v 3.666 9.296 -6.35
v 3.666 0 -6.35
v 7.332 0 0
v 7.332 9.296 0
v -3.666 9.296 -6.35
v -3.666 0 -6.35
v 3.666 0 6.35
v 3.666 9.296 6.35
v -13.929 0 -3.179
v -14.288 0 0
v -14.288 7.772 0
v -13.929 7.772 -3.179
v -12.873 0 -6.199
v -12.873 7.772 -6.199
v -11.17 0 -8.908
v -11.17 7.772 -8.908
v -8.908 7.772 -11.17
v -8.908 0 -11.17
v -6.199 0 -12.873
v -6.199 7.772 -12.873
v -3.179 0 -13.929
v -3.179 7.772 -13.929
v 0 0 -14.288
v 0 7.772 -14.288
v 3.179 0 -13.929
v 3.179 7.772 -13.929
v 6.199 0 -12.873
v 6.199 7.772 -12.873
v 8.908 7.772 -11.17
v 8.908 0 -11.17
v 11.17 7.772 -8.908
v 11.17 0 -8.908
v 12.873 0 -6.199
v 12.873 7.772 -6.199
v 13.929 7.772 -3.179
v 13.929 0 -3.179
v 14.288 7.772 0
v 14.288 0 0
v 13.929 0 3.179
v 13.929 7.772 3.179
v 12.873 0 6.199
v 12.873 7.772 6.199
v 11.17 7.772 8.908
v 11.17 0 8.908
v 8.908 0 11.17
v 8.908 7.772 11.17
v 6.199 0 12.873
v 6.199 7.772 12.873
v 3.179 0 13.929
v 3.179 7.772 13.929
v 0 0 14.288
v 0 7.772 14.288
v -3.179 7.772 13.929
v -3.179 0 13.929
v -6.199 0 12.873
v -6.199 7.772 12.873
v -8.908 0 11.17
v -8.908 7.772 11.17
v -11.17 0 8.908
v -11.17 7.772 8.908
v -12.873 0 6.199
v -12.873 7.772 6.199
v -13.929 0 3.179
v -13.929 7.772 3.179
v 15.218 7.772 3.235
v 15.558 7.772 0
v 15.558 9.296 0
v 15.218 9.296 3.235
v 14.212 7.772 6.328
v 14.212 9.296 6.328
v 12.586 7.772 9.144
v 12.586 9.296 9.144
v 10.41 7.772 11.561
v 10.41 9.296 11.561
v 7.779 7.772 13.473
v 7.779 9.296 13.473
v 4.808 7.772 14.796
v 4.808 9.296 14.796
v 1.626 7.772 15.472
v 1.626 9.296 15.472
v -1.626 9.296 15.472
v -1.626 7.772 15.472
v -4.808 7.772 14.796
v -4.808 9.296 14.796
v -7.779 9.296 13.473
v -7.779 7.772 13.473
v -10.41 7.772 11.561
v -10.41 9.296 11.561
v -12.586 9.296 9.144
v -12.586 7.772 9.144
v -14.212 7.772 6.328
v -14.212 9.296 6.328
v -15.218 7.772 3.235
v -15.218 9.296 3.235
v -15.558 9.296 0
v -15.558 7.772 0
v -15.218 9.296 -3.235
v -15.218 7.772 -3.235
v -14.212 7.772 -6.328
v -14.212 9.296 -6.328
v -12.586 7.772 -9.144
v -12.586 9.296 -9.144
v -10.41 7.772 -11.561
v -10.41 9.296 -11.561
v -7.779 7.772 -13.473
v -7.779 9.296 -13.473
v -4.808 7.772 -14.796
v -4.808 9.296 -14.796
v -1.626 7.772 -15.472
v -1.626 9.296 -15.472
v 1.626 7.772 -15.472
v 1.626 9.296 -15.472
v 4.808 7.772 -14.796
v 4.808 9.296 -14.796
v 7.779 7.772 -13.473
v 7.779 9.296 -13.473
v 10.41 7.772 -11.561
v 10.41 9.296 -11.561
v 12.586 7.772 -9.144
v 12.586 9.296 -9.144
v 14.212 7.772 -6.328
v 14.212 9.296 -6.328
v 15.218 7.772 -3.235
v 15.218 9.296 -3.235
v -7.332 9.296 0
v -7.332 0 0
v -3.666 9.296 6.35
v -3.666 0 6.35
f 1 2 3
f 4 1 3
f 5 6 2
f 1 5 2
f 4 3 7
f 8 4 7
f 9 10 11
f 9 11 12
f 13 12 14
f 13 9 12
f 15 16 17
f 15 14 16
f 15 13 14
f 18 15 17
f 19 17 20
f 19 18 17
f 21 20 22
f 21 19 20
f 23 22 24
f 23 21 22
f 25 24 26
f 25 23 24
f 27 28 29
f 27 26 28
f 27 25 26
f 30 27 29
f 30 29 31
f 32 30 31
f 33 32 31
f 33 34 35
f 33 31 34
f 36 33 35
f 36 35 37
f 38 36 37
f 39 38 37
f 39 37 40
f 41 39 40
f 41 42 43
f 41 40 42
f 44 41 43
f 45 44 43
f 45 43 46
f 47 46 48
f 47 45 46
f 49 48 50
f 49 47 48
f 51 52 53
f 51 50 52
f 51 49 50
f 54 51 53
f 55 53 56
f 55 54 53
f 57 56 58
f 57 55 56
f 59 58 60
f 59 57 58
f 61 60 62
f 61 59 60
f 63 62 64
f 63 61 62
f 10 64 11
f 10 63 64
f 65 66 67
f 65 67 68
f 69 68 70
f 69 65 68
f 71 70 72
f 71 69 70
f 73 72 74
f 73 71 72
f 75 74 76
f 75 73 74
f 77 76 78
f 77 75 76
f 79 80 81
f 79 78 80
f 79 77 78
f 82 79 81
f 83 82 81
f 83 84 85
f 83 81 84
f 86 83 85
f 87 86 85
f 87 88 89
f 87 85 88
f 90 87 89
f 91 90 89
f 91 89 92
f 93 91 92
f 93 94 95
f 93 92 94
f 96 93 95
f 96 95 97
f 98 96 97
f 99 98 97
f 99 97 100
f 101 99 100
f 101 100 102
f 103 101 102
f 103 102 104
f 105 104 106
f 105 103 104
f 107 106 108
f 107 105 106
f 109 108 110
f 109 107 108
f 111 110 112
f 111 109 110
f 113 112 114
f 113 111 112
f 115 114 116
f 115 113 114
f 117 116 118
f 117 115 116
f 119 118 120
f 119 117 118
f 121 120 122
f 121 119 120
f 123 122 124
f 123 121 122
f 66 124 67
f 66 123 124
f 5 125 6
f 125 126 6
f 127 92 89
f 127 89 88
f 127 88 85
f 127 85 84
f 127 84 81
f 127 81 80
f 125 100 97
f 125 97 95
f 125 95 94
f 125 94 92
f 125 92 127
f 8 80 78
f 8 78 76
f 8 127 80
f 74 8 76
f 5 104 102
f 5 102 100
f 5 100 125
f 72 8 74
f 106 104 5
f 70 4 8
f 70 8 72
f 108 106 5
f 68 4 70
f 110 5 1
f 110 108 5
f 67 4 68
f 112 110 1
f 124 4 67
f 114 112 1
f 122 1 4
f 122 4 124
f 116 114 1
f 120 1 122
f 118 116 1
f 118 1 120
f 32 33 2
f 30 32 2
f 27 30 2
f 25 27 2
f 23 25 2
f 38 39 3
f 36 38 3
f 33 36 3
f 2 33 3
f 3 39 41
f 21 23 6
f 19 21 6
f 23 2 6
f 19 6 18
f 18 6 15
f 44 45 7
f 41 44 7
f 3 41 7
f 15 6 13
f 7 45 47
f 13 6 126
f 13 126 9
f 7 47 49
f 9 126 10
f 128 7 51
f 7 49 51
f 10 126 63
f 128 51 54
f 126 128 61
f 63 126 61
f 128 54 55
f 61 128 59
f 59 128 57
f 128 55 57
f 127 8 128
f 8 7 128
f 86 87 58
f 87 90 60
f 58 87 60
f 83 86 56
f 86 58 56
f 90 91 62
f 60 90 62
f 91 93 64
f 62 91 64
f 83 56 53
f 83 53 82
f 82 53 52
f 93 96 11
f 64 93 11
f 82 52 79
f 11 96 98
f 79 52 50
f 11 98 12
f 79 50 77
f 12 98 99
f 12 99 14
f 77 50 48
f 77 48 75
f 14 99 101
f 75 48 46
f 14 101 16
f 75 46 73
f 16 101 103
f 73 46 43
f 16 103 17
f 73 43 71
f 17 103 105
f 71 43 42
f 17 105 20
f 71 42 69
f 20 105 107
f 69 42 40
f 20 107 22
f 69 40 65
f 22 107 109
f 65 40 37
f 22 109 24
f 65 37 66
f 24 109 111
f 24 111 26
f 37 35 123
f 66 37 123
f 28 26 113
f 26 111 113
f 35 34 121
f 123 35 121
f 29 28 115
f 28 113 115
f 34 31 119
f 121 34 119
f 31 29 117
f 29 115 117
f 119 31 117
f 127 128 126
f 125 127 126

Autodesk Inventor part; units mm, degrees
ref_plane "YZ Plane" through (0, 0, 0) normal (1, 0, 0) x (0, 1, 0)
ref_plane "XZ Plane" through (0, 0, 0) normal (0, 1, 0) x (-1, 0, 0)
ref_plane "XY Plane" through (0, 0, 0) normal (0, 0, 1) x (1, 0, 0)
sketch "Sketch1" plane through (0, 0, 0) normal (0, 1, 0) x (-1, 0, 0)
  circle A0 centre (0, 0) radius 14.2875
  line L0 (3.6662, 6.35) -> (7.3323, 0)
  line L1 (7.3323, 0) -> (3.6662, -6.35)
  line L2 (3.6662, -6.35) -> (-3.6662, -6.35)
  line L3 (-3.6662, -6.35) -> (-7.3323, 0)
  line L4 (-7.3323, 0) -> (-3.6662, 6.35)
  line L5 (-3.6662, 6.35) -> (3.6662, 6.35)
  dimension "d0" = 28.575
  dimension "d1" = 12.7
extrude "Extrusion1" add sketch "Sketch1" along normal blind 7.7724
sketch "Sketch2" plane through (0, 7.7724, 0) normal (0, 1, 0) x (1, 0, 0)
  circle A0 centre (0, 0) radius 15.5575
  line L0 (-3.6662, 6.35) -> (3.6662, 6.35) projected
  line L1 (-3.6662, 6.35) -> (3.6662, 6.35)
  line L2 (3.6662, 6.35) -> (7.3323, 0)
  line L3 (7.3323, 0) -> (3.6662, -6.35)
  line L4 (3.6662, -6.35) -> (-3.6662, -6.35)
  line L5 (-3.6662, -6.35) -> (-7.3323, 0)
  line L6 (-7.3323, 0) -> (-3.6662, 6.35)
  dimension "d4" = 31.115
extrude "Extrusion2" add sketch "Sketch2" along normal blind 1.524
properties part number "hex bearing" material "Steel"
